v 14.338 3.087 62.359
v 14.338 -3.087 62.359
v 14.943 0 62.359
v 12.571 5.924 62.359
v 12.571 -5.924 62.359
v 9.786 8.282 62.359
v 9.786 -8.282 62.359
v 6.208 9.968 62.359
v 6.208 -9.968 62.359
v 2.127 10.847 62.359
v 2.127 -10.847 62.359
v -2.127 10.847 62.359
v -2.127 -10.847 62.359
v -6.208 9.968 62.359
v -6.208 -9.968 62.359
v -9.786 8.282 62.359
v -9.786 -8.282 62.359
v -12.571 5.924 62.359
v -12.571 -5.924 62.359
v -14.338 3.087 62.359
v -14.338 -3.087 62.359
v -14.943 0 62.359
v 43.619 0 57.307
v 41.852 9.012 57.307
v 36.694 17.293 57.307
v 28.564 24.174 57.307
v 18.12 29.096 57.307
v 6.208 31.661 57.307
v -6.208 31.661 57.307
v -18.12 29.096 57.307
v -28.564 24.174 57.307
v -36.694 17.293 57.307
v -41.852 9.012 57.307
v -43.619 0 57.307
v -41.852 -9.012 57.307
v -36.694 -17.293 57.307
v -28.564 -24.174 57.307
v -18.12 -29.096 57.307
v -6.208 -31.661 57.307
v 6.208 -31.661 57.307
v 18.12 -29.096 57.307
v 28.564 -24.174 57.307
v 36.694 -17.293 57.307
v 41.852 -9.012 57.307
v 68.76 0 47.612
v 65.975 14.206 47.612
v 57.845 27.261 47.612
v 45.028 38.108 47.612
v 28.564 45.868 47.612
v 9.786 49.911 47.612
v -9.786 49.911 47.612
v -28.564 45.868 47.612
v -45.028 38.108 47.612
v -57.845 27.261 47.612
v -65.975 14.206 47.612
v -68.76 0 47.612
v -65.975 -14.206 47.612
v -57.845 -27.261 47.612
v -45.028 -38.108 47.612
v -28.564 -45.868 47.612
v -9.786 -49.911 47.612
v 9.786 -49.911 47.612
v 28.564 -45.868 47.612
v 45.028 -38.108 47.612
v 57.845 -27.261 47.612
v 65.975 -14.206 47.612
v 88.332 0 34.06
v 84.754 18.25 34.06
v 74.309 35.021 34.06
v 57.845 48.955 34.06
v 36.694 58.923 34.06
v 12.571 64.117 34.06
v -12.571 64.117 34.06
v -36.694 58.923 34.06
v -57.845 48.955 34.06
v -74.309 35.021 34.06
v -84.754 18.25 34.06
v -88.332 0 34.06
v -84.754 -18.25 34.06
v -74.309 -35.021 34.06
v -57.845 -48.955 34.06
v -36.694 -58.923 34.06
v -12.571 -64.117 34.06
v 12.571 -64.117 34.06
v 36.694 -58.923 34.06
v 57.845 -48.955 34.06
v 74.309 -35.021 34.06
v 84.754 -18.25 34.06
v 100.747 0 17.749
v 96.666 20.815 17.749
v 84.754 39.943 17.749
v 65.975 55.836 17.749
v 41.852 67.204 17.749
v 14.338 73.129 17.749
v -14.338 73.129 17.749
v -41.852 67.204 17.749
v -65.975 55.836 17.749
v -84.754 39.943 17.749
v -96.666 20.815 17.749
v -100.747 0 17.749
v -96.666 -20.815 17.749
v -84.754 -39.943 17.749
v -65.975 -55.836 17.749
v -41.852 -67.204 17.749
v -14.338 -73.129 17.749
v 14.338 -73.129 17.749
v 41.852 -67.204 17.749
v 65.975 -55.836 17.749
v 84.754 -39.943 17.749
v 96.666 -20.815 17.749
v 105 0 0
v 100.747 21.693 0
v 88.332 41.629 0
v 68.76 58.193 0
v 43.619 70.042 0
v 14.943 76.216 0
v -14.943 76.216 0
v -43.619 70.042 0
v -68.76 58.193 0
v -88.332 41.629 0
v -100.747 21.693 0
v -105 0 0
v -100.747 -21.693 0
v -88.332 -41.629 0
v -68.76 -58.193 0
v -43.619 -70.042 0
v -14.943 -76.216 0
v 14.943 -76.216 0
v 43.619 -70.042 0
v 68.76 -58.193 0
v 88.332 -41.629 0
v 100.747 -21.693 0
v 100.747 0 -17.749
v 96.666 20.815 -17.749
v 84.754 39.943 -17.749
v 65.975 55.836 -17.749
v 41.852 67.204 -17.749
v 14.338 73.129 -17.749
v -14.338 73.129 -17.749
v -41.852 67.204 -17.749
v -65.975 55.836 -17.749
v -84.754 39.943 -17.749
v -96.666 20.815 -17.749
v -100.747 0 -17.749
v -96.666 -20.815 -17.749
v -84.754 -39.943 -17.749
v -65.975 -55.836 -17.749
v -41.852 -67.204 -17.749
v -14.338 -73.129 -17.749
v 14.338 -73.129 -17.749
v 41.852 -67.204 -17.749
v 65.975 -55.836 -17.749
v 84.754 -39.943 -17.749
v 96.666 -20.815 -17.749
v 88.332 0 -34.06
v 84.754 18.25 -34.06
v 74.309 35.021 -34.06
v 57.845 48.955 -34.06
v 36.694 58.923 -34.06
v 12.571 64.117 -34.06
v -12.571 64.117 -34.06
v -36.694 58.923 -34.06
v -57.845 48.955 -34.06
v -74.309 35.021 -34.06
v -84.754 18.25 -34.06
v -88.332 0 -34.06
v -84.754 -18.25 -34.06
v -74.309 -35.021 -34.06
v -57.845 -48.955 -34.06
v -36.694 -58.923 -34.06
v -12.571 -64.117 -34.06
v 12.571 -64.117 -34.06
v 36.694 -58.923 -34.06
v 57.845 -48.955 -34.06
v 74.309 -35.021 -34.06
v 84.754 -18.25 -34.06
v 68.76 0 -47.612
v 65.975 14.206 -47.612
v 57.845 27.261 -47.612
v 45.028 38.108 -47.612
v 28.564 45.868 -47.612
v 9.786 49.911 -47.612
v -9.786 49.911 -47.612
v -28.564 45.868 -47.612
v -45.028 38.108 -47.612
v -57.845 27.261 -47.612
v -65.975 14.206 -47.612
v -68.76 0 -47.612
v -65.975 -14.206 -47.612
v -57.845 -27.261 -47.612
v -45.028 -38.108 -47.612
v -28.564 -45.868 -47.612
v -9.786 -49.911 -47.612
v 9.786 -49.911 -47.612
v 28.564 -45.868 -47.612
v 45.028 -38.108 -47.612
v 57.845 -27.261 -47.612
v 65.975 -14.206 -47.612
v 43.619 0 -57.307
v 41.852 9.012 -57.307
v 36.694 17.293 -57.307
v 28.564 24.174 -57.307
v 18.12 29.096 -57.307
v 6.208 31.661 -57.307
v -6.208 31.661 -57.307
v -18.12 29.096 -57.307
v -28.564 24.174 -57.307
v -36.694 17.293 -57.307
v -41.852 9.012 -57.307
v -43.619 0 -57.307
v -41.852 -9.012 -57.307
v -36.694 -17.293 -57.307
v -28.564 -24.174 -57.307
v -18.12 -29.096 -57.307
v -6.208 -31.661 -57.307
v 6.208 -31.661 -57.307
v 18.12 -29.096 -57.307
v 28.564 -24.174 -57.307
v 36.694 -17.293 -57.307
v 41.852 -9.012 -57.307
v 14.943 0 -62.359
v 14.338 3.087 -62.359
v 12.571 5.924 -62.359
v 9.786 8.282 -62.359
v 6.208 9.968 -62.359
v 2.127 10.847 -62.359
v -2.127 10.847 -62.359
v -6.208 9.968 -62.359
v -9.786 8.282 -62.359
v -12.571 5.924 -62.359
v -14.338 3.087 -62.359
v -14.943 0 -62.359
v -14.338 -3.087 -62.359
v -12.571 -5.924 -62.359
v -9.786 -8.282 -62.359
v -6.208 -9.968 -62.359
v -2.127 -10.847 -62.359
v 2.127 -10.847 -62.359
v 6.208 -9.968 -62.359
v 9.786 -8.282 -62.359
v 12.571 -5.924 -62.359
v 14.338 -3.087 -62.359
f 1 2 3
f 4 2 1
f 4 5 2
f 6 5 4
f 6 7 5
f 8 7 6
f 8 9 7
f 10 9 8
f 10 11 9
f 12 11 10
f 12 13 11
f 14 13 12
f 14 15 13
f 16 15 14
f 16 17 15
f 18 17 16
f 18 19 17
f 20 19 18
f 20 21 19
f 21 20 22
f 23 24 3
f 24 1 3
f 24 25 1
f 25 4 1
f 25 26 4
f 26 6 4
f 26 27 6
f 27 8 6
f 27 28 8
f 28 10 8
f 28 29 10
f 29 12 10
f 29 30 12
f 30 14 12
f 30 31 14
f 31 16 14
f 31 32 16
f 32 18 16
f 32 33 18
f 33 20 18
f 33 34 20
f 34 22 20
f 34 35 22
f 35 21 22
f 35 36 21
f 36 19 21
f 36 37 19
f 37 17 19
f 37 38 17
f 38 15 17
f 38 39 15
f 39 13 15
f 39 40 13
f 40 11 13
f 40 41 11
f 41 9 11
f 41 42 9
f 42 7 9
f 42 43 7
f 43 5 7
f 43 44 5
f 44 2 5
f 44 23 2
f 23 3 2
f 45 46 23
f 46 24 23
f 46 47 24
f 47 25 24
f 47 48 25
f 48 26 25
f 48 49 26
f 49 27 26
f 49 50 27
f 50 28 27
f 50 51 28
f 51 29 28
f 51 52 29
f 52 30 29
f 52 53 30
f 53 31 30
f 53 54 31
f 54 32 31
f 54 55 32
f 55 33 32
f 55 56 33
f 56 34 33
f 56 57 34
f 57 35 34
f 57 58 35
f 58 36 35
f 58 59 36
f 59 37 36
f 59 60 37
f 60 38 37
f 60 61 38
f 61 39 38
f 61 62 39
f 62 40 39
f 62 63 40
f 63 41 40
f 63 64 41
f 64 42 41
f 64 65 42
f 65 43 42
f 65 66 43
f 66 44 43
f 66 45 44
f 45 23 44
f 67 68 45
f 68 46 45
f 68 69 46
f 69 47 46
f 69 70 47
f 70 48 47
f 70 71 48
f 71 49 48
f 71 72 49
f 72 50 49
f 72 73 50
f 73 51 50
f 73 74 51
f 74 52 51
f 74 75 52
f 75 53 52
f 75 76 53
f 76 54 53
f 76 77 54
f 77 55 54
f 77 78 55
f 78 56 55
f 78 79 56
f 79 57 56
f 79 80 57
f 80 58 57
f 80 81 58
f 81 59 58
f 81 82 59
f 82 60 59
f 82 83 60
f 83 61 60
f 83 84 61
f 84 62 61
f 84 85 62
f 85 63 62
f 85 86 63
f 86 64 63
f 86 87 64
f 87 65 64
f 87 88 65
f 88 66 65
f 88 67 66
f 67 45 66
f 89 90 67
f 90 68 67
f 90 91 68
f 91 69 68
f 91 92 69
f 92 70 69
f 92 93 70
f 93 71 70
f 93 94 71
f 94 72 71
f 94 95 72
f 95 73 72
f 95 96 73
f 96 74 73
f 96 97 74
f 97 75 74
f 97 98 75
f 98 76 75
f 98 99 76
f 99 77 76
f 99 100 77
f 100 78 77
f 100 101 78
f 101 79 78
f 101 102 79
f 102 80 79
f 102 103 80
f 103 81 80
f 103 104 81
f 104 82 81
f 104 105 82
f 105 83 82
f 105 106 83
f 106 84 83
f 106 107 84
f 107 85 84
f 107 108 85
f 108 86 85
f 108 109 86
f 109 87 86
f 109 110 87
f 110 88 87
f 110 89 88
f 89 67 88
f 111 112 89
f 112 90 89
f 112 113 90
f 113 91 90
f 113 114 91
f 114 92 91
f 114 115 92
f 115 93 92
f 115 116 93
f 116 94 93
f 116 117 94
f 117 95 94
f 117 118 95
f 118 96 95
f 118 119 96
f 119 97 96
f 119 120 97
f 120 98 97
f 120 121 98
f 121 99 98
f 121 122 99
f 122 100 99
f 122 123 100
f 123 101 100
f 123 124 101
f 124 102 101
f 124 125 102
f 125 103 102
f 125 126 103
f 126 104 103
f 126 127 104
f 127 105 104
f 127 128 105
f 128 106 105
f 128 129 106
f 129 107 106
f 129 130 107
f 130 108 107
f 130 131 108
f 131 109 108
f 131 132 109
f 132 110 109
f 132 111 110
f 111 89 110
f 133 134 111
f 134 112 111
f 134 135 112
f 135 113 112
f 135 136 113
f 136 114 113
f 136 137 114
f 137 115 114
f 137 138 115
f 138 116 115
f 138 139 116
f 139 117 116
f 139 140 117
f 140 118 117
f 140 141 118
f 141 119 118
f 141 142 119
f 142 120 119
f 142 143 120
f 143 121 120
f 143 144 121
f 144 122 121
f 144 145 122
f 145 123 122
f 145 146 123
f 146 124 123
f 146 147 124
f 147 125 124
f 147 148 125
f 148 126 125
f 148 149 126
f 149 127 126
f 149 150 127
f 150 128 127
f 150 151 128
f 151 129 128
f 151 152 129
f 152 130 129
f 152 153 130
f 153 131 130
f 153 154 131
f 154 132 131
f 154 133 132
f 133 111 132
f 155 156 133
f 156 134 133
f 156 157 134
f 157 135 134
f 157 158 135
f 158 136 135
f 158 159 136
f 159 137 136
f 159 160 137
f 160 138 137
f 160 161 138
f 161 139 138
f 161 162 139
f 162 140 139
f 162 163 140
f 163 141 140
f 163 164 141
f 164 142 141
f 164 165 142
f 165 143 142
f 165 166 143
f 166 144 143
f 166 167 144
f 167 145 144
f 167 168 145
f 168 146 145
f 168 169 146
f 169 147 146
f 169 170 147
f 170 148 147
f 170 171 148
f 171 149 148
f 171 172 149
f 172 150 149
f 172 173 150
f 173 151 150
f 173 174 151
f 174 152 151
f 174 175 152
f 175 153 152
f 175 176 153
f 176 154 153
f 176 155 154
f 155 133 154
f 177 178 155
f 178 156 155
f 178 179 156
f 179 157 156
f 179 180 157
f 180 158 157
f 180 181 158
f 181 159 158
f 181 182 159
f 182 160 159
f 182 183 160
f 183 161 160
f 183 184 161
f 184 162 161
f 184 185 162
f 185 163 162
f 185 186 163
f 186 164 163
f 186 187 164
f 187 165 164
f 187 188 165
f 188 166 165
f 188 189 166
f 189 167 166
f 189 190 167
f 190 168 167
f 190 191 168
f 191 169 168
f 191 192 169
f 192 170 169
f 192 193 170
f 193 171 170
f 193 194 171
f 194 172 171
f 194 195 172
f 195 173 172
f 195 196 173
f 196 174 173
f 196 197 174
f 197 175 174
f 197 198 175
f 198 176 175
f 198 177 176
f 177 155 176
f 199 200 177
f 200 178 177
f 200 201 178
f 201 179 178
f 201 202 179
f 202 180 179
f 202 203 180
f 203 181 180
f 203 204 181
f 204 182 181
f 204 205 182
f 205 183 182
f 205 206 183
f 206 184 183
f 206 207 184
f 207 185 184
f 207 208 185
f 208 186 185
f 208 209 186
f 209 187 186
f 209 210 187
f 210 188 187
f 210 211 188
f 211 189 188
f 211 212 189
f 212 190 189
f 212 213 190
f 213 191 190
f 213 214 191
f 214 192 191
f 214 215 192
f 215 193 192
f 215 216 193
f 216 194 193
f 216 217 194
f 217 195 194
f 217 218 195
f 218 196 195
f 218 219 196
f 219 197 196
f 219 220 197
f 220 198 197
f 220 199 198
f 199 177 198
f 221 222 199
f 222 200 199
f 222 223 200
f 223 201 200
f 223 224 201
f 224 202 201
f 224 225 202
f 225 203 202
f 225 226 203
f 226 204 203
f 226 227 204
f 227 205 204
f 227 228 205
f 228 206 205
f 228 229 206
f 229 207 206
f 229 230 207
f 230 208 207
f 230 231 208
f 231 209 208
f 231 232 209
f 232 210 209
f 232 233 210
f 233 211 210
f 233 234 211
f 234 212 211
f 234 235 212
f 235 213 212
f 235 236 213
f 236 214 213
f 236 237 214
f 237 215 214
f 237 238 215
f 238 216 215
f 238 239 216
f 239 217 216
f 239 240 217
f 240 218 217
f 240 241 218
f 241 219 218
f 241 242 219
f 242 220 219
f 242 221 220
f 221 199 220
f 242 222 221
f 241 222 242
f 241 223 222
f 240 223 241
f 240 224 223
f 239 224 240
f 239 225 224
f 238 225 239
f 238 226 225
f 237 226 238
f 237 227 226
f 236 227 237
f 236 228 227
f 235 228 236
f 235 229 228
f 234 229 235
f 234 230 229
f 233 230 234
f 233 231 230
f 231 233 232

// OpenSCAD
// Generated by SolidPython 1.0.1 on 2020-07-29 00:46:52


scale(v = [15, 11, 9]) {
	sphere(r = 7);
}
/***********************************************
*********      SolidPython code:      **********
************************************************
 
# import packages: SolidPython
from solid import *
from solid.utils import *
from itertools import chain, combinations, permutations


class Resize:

    def __init__(self, scad_file):
        self.scad_file = scad_file
        #self.scad_file = import_scad(scad_file)
        # cone/cylinder param:
        self.r1 = 0
        self.r2 = 0
        self.h = 0
        # rectangular prism param:
        self.w = 0
        self.l = 0
        # ellipse param:
        self.r = 0

    # import OpenScad code (file name corresponds to shape)


    # classify shape + parameters
    def assign(self, param1, param2, param3):
        if self.scad_file == 'cone.scad':
            self.r1 = param1
            self.r2 = param2
            self.h = param3
        elif self.scad_file == 'cylinder.scad':
            self.r1 = param1
            self.r2 = param2
            self.h = param3
        elif self.scad_file == 'rectangularPrism.scad':
            self.h = param1
            self.l = param2
            self.w = param3
        else:
            self.r = param1
            self.h = param2

    # resize parameters
    def iterate(self):
        x = range(3, 20, 2)
        i = 1
        if self.scad_file == 'cone.scad':
            tempList = list(permutations(x, 2))
            for temp in tempList:
                param1 = temp[0]
                param2 = temp[1]
                filepath = 'produced_scad_files/' + 'cone' + str(param1) + '_' + str(param2) + '_' + '.scad'
                scad_render_to_file(cylinder(h=param1, r1=param2, r2=0), filepath)

        elif self.scad_file == 'cylinder.scad':
            tempList = list(permutations(x, 3))
            for temp in tempList:
                param1 = temp[0]
                param2 = temp[1]
                filepath = 'produced_scad_files/' + 'cylinder' + str(param1) + '_' + str(param2) + '_' + '.scad'
                scad_render_to_file(cylinder(h=param1, r1=param2, r2=param2), filepath)

        elif self.scad_file == 'rectangularPrism.scad':
            tempList = list(permutations(x, 3))
            for temp in tempList:
                param1 = temp[0]
                param2 = temp[1]
                param3 = temp[2]
                filepath = 'produced_scad_files/' + 'rectangularPrism' + str(param1) + '_' + str(param2) + '_' + str(
                    param3) + '.scad'
                scad_render_to_file(cube(size=(param1, param2, param3)), filepath)

        elif self.scad_file == 'ellipse.scad':
            tempList = list(permutations(x, 4))
            for temp in tempList:
                param1 = temp[0]
                param2 = temp[1]
                param3 = temp[2]
                param4 = temp[3]
                filepath = 'produced_scad_files/' + 'ellipse' + str(param1) + '_' + str(param2) + '_' + str(param3) + '_' + str(param4) + '.scad'
                scad_render_to_file(scale([param1, param2, param3])(sphere(r=param4)), filepath)

    def render_to_scadfile(self):
        scad_render_to_file(scad, 'example.scad') 
 
************************************************/
